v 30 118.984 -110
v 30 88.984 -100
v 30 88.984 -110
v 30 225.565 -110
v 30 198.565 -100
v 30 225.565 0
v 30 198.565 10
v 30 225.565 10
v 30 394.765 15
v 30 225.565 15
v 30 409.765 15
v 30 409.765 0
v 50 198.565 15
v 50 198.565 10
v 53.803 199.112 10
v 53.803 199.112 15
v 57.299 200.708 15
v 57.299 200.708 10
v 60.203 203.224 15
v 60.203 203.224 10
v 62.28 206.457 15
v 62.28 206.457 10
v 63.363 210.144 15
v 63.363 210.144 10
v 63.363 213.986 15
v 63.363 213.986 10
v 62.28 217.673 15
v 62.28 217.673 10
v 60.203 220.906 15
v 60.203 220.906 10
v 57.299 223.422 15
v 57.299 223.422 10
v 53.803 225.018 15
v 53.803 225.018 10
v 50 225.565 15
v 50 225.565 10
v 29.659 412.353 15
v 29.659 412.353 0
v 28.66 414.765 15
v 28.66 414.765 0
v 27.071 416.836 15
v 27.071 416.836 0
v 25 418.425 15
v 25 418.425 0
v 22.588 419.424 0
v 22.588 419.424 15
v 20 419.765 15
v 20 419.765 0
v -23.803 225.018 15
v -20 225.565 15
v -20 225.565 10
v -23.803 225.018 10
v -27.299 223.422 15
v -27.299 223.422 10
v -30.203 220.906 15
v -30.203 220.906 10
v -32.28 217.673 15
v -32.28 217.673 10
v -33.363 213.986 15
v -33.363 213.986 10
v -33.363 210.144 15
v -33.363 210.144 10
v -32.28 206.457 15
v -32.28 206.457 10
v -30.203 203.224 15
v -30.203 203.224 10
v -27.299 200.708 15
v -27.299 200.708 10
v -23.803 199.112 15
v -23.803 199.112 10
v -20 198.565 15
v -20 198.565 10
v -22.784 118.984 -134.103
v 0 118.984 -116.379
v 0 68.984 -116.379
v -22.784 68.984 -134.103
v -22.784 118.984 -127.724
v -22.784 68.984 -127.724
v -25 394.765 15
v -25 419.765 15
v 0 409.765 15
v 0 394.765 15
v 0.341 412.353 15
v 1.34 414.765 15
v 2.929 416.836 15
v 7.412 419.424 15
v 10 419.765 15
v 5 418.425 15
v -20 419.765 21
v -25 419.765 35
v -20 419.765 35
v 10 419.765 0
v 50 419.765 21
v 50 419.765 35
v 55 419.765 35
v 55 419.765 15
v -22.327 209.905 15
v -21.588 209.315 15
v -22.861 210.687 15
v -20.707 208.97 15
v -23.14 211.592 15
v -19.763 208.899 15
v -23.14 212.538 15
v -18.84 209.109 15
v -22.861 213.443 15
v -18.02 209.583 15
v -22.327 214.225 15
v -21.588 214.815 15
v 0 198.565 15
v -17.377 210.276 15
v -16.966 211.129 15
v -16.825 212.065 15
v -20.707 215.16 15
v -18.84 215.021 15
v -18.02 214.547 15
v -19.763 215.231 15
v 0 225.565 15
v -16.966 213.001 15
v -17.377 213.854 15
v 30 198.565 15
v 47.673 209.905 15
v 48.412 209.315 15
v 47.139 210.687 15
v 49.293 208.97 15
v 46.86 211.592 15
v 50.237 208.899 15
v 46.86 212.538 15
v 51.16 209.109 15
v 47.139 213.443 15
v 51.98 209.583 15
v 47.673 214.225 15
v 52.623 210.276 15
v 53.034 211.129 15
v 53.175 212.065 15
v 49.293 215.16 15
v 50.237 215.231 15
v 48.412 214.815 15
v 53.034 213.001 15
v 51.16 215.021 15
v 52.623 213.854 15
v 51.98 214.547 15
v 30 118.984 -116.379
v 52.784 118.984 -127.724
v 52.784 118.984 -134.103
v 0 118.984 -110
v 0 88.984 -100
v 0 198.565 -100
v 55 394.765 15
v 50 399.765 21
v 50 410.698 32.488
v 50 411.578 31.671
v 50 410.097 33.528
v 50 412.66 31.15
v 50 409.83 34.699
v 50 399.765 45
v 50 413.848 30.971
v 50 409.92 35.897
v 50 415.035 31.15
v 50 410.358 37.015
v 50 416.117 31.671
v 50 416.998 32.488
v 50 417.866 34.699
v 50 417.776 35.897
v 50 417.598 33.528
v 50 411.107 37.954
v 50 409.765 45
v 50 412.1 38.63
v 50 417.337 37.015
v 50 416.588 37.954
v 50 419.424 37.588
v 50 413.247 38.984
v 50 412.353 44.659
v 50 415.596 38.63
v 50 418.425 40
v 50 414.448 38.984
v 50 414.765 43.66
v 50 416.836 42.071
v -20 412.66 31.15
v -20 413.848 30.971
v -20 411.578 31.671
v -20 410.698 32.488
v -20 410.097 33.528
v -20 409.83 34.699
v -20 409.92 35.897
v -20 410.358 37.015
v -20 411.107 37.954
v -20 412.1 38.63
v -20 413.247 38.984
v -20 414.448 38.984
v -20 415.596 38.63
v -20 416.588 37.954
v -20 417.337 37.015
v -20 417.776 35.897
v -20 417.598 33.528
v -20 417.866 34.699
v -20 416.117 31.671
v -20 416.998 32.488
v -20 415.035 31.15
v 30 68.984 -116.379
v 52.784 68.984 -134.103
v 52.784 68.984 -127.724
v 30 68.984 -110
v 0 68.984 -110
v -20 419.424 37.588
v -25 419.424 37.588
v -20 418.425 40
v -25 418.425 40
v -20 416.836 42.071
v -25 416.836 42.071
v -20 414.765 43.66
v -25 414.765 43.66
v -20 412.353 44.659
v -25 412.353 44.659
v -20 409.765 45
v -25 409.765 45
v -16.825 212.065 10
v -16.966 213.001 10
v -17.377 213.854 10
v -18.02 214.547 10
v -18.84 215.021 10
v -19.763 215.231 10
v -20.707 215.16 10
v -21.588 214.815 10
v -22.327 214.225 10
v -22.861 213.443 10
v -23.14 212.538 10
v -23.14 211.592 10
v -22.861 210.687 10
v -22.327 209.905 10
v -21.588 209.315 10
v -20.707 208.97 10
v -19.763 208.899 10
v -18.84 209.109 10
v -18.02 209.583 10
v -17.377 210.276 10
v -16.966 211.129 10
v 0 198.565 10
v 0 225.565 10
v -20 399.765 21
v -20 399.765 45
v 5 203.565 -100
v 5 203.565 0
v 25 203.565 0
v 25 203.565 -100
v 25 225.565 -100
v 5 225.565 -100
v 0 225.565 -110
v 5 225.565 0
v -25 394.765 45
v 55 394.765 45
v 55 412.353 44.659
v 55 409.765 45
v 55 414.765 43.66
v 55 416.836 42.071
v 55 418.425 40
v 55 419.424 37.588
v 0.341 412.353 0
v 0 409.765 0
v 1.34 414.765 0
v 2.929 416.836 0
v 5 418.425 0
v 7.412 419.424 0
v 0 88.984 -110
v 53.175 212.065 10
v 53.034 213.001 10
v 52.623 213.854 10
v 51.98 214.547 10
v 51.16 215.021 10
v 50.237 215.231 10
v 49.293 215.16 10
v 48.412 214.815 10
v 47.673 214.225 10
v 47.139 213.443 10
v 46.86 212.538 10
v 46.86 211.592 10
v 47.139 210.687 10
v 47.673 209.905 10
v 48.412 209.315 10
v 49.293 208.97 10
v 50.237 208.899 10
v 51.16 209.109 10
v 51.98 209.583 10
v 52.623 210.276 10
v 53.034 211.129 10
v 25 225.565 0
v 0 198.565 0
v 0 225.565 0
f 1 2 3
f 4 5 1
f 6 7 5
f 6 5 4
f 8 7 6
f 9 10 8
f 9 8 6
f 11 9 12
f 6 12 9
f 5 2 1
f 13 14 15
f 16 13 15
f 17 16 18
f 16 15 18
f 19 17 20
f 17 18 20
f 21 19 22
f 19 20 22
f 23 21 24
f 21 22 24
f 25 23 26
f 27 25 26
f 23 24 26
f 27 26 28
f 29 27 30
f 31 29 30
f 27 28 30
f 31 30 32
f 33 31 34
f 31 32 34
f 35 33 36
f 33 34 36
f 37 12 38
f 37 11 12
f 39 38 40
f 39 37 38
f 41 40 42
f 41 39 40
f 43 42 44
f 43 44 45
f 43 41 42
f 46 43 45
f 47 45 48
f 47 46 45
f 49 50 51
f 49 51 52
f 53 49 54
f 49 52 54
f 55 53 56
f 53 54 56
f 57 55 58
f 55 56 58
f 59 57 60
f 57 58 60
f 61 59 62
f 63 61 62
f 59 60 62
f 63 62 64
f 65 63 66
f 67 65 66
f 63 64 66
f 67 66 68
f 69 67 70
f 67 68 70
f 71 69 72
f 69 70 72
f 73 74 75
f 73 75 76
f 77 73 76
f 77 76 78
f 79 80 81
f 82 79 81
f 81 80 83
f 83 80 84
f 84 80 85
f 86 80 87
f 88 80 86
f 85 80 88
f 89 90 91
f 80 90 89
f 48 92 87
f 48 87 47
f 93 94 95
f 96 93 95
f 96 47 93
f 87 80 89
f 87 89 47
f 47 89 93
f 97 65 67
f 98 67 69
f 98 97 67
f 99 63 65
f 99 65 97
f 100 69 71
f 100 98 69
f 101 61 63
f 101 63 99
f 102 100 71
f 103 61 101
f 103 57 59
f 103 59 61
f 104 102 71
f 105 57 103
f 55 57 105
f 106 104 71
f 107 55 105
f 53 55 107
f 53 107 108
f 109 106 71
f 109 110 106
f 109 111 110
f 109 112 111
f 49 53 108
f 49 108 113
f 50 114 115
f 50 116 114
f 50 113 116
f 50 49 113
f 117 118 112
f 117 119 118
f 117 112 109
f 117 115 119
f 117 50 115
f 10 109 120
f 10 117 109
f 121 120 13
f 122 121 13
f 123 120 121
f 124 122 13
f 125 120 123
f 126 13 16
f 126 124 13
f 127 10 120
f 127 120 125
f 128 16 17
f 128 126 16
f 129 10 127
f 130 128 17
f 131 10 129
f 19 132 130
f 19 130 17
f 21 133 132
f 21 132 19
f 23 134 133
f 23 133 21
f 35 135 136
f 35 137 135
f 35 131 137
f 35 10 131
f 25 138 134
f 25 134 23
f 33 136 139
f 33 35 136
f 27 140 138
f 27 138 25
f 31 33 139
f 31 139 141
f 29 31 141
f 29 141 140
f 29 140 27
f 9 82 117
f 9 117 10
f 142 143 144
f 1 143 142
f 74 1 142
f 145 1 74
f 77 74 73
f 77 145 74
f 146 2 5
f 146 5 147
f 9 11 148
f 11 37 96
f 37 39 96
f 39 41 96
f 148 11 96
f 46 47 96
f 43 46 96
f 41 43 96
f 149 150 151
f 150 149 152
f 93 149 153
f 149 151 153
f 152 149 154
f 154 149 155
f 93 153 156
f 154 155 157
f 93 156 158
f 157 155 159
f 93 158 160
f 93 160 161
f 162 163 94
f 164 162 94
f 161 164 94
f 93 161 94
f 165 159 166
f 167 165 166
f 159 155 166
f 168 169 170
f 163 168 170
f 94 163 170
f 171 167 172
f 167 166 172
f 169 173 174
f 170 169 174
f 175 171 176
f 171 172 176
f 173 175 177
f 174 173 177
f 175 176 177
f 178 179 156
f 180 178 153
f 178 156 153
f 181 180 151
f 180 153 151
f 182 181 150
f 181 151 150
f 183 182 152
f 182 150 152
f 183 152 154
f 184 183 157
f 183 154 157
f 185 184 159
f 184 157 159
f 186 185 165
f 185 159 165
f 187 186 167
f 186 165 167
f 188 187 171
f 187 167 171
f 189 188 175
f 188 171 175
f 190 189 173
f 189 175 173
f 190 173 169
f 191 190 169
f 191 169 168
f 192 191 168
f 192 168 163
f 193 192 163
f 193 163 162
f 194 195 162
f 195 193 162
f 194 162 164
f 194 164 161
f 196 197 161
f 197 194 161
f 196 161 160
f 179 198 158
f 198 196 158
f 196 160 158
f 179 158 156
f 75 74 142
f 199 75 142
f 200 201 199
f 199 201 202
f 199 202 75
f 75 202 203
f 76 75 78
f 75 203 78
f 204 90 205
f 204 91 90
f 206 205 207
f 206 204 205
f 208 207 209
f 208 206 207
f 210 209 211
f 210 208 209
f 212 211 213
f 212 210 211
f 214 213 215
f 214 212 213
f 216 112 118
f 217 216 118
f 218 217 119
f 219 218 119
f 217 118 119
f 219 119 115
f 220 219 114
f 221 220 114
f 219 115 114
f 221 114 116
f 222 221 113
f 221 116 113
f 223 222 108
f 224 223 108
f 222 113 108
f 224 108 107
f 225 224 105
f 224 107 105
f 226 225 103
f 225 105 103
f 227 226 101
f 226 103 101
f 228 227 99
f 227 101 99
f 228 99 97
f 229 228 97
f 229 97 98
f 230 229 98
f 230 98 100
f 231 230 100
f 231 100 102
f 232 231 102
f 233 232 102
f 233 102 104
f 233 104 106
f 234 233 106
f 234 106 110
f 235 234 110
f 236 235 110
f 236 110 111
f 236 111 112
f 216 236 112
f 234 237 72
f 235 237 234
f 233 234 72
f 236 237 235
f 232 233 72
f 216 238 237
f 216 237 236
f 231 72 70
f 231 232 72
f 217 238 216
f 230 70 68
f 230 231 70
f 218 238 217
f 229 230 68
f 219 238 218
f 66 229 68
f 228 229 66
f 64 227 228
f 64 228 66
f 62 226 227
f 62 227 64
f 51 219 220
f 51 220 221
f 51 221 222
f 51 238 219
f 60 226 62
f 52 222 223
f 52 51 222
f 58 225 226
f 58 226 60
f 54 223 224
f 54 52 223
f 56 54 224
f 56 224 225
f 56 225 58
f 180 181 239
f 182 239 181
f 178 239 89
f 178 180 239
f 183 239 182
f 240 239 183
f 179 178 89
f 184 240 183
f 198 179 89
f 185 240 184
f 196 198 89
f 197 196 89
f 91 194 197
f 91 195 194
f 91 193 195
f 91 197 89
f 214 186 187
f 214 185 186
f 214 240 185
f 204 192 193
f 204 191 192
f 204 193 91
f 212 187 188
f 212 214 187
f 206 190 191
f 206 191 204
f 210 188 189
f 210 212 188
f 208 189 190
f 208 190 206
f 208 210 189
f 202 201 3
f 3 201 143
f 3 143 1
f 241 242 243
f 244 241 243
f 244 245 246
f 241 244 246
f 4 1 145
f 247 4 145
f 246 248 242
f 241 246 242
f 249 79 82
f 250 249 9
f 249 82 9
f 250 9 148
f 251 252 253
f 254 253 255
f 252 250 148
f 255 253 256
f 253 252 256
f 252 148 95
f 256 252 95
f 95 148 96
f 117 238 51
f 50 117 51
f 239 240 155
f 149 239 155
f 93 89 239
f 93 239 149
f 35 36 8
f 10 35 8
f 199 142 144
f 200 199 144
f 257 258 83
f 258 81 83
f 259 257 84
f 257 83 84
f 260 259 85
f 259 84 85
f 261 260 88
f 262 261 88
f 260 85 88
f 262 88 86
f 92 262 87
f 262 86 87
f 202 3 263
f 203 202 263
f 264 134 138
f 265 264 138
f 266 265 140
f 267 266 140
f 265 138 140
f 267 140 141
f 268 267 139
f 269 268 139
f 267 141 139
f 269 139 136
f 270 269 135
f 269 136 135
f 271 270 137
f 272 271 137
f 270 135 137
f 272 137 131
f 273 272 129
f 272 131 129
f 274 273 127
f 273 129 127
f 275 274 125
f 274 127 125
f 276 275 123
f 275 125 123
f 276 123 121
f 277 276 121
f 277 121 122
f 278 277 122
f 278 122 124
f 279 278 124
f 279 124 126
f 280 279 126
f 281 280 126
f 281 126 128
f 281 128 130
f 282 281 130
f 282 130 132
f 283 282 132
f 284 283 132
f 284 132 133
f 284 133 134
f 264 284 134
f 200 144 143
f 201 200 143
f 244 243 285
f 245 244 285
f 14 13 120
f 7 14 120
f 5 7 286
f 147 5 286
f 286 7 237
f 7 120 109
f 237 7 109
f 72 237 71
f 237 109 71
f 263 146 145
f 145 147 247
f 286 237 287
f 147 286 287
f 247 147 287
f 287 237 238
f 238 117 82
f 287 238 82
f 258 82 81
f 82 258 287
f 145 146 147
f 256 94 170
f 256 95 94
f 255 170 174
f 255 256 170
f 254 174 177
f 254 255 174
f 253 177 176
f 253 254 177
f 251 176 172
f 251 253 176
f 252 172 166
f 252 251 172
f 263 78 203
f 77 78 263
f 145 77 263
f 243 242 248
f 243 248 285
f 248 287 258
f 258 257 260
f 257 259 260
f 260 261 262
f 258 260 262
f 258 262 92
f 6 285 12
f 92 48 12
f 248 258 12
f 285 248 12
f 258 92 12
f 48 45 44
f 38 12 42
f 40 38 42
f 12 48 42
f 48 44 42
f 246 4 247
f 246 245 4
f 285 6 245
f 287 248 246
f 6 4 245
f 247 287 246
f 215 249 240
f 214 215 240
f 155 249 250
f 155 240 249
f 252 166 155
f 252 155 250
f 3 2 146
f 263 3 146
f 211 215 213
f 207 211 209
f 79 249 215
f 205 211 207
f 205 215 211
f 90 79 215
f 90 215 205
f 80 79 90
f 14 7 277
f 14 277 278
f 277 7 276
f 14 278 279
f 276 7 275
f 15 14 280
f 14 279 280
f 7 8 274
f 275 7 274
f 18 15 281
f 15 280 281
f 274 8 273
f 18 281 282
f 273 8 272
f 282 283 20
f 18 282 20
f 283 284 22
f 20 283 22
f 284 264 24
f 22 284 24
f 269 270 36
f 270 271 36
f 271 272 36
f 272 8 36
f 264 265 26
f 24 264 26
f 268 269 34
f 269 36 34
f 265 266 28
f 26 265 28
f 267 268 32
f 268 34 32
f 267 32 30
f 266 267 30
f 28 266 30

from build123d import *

# Parameters (mm, degrees)
SKETCH1_W                       = 30
SKETCH1_H                       = 194.2
SKETCH1_H_2                     = 27
SKETCH1_H_3                     = 261.4
EXTRUDE1_DEPTH                  = 15
FILLET1_R                       = 10
EXTRUDE2_DEPTH                  = 10
SKETCH3_W                       = 80
SKETCH3_H                       = 25
EXTRUDE3_DEPTH                  = 30
SKETCH5_W                       = 70
SKETCH5_H                       = 20
EXTRUDE4_DEPTH                  = 24
FILLET2_R                       = 10
EXTRUDE5_REACH                  = 432.349
SKETCH6_R                       = 4.029178008
SKETCH7_W                       = 30
SKETCH7_H                       = 263.372286267
EXTRUDE6_DEPTH                  = 427.91910061
EXTRUDE7_DEPTH                  = 100
SKETCH9_W                       = 30
SKETCH9_H                       = 136.58118173
EXTRUDE8_DEPTH                  = 10
F_1_4_0_25_DIAMETER_HOLE1_D     = 6.35
F_1_4_0_25_DIAMETER_HOLE1_DEPTH = 10
F_1_4_0_25_DIAMETER_HOLE1_TIP   = 1.907732465
EXTRUDE12_DEPTH                 = 20
EXTRUDE12_DEPTH_BACK            = 30
SKETCH11_W                      = 15
SKETCH11_H                      = 6.378618897


with BuildPart() as part:
    # Sketch1 → Extrude1 (new body)
    with BuildSketch(Plane.XY):
        with Locations((15, 322.665015772)):
            Rectangle(SKETCH1_W, SKETCH1_H)
        with BuildLine():
            Line((30, 225.565015772), (30, 198.565015772))
            Line((30, 198.565015772), (50, 198.565015772))
            ThreePointArc((50, 198.565015772), (63.5, 212.065015772), (50, 225.565015772))
            Line((50, 225.565015772), (30, 225.565015772))
        make_face()
        with Locations((15, 212.065015772)):
            Rectangle(SKETCH1_W, SKETCH1_H_2)
        with BuildLine():
            Line((-20, 198.565015772), (0, 198.565015772))
            Line((0, 198.565015772), (0, 225.565015772))
            Line((0, 225.565015772), (-20, 225.565015772))
            ThreePointArc((-20, 225.565015772), (-33.5, 212.065015772), (-20, 198.565015772))
        make_face()
        with Locations((15, 67.865015772)):
            Rectangle(SKETCH1_W, SKETCH1_H_3)
    extrude(amount=EXTRUDE1_DEPTH)

    # Fillet1
    fillet1_edges = [part.edges().sort_by_distance(p)[0] for p in [
        (0, 419.765015772, 7.5),
        (30, 419.765015772, 7.5),
        (30, -62.834984228, 7.5),
        (0, -62.834984228, 7.5),
    ]]
    fillet(fillet1_edges, radius=FILLET1_R)

    # Sketch2 → Extrude2 (cut)
    with BuildSketch(Plane(origin=(0, 0, 0), x_dir=(-1, 0, 0), z_dir=(0, 0, -1))):
        with BuildLine():
            Line((-50, 225.565015772), (-30, 225.565015772))
            Line((-30, 225.565015772), (-30, 198.565015772))
            Line((-30, 198.565015772), (-50, 198.565015772))
            ThreePointArc((-50, 198.565015772), (-63.5, 212.065015772), (-50, 225.565015772))
        make_face()
        with BuildLine():
            Line((0, 198.565015772), (20, 198.565015772))
            ThreePointArc((20, 198.565015772), (33.5, 212.065015772), (20, 225.565015772))
            Line((20, 225.565015772), (0, 225.565015772))
            Line((0, 225.565015772), (0, 198.565015772))
        make_face()
    extrude(amount=-EXTRUDE2_DEPTH, mode=Mode.SUBTRACT)

    # Sketch3 → Extrude3 (add)
    with BuildSketch(Plane.XY.offset(15)):
        with Locations((15, 407.265015772)):
            Rectangle(SKETCH3_W, SKETCH3_H)
    extrude(amount=EXTRUDE3_DEPTH)

    # Sketch5 → Extrude4 (cut)
    with BuildSketch(Plane.XY.offset(45)):
        with Locations((15, 409.765015772)):
            Rectangle(SKETCH5_W, SKETCH5_H)
    extrude(amount=-EXTRUDE4_DEPTH, mode=Mode.SUBTRACT)

    # Fillet2
    fillet2_edges = [part.edges().sort_by_distance(p)[0] for p in [
        (52.5, 419.765015772, 45),
        (-22.5, 419.765015772, 45),
    ]]
    fillet(fillet2_edges, radius=FILLET2_R)

    # Sketch6 → Extrude5 (add, up to next)
    with BuildSketch(Plane.ZY.offset(-50), mode=Mode.PRIVATE) as extrude5_sk1:
        with Locations(Location((35, 413.847695375, 0), (0, 0, 180))):
            Circle(SKETCH6_R)
    extrude5_tool1 = extrude(extrude5_sk1.sketch, amount=EXTRUDE5_REACH, mode=Mode.PRIVATE) - part.part
    add(extrude5_tool1.solids().sort_by_distance((50, 413.847695, 35))[0])

    # Sketch7 → Extrude6 (cut, through all)
    with BuildSketch(Plane(origin=(0, 0, 0), x_dir=(-1, 0, 0), z_dir=(0, 0, -1))):
        with Locations((-15, 66.878872639)):
            Rectangle(SKETCH7_W, SKETCH7_H)
    extrude(amount=-EXTRUDE6_DEPTH, mode=Mode.SUBTRACT)

    # Sketch8 → Extrude7 (add)
    with BuildSketch(Plane(origin=(0, 0, 0), x_dir=(-1, 0, 0), z_dir=(0, 0, -1))):
        Polygon((-30, 198.565015772), (0, 198.565015772), (0, 225.565015772), (-5, 225.565015772), (-5, 203.565015772), (-25, 203.565015772), (-25, 225.565015772), (-30, 225.565015772), align=None)
    extrude(amount=EXTRUDE7_DEPTH)

    # Sketch9 → Extrude8 (add)
    with BuildSketch(Plane(origin=(0, 0, -100), x_dir=(-1, 0, 0), z_dir=(0, 0, -1))):
        with Locations((-15, 157.274424907)):
            Rectangle(SKETCH9_W, SKETCH9_H)
    extrude(amount=EXTRUDE8_DEPTH)

    # 1/4 (0.25) Diameter Hole1
    with Locations(Plane(origin=(-20, 212.065015772, 10), x_dir=(-1, 0, 0), z_dir=(0, 0, -1))):
        with Locations((0, 0), (-70, 0)):
            Hole(F_1_4_0_25_DIAMETER_HOLE1_D / 2, depth=F_1_4_0_25_DIAMETER_HOLE1_DEPTH)
            with Locations((0, 0, -(F_1_4_0_25_DIAMETER_HOLE1_DEPTH + F_1_4_0_25_DIAMETER_HOLE1_TIP / 2))):  # 118° drill point
                Cone(0, F_1_4_0_25_DIAMETER_HOLE1_D / 2, F_1_4_0_25_DIAMETER_HOLE1_TIP, mode=Mode.SUBTRACT)

    # Sketch11 → Extrude12 (add, two sides: drawn at the far end of the back side and taken through both)
    with BuildSketch(Plane.XZ.offset(-88.983834042).offset(-EXTRUDE12_DEPTH_BACK)):
        Polygon((0, -116.378618897), (-22.784065685, -134.102681991), (-22.784065685, -127.724063095), (0, -110), align=None)
        with Locations((22.5, -113.189309449)):
            Rectangle(SKETCH11_W, SKETCH11_H)
        with Locations((7.5, -113.189309449)):
            Rectangle(SKETCH11_W, SKETCH11_H)
        Polygon((30, -116.378618897), (52.784065685, -134.102681991), (52.784065685, -127.724063095), (30, -110), align=None)
    extrude(amount=EXTRUDE12_DEPTH + EXTRUDE12_DEPTH_BACK)


solid = part.part
